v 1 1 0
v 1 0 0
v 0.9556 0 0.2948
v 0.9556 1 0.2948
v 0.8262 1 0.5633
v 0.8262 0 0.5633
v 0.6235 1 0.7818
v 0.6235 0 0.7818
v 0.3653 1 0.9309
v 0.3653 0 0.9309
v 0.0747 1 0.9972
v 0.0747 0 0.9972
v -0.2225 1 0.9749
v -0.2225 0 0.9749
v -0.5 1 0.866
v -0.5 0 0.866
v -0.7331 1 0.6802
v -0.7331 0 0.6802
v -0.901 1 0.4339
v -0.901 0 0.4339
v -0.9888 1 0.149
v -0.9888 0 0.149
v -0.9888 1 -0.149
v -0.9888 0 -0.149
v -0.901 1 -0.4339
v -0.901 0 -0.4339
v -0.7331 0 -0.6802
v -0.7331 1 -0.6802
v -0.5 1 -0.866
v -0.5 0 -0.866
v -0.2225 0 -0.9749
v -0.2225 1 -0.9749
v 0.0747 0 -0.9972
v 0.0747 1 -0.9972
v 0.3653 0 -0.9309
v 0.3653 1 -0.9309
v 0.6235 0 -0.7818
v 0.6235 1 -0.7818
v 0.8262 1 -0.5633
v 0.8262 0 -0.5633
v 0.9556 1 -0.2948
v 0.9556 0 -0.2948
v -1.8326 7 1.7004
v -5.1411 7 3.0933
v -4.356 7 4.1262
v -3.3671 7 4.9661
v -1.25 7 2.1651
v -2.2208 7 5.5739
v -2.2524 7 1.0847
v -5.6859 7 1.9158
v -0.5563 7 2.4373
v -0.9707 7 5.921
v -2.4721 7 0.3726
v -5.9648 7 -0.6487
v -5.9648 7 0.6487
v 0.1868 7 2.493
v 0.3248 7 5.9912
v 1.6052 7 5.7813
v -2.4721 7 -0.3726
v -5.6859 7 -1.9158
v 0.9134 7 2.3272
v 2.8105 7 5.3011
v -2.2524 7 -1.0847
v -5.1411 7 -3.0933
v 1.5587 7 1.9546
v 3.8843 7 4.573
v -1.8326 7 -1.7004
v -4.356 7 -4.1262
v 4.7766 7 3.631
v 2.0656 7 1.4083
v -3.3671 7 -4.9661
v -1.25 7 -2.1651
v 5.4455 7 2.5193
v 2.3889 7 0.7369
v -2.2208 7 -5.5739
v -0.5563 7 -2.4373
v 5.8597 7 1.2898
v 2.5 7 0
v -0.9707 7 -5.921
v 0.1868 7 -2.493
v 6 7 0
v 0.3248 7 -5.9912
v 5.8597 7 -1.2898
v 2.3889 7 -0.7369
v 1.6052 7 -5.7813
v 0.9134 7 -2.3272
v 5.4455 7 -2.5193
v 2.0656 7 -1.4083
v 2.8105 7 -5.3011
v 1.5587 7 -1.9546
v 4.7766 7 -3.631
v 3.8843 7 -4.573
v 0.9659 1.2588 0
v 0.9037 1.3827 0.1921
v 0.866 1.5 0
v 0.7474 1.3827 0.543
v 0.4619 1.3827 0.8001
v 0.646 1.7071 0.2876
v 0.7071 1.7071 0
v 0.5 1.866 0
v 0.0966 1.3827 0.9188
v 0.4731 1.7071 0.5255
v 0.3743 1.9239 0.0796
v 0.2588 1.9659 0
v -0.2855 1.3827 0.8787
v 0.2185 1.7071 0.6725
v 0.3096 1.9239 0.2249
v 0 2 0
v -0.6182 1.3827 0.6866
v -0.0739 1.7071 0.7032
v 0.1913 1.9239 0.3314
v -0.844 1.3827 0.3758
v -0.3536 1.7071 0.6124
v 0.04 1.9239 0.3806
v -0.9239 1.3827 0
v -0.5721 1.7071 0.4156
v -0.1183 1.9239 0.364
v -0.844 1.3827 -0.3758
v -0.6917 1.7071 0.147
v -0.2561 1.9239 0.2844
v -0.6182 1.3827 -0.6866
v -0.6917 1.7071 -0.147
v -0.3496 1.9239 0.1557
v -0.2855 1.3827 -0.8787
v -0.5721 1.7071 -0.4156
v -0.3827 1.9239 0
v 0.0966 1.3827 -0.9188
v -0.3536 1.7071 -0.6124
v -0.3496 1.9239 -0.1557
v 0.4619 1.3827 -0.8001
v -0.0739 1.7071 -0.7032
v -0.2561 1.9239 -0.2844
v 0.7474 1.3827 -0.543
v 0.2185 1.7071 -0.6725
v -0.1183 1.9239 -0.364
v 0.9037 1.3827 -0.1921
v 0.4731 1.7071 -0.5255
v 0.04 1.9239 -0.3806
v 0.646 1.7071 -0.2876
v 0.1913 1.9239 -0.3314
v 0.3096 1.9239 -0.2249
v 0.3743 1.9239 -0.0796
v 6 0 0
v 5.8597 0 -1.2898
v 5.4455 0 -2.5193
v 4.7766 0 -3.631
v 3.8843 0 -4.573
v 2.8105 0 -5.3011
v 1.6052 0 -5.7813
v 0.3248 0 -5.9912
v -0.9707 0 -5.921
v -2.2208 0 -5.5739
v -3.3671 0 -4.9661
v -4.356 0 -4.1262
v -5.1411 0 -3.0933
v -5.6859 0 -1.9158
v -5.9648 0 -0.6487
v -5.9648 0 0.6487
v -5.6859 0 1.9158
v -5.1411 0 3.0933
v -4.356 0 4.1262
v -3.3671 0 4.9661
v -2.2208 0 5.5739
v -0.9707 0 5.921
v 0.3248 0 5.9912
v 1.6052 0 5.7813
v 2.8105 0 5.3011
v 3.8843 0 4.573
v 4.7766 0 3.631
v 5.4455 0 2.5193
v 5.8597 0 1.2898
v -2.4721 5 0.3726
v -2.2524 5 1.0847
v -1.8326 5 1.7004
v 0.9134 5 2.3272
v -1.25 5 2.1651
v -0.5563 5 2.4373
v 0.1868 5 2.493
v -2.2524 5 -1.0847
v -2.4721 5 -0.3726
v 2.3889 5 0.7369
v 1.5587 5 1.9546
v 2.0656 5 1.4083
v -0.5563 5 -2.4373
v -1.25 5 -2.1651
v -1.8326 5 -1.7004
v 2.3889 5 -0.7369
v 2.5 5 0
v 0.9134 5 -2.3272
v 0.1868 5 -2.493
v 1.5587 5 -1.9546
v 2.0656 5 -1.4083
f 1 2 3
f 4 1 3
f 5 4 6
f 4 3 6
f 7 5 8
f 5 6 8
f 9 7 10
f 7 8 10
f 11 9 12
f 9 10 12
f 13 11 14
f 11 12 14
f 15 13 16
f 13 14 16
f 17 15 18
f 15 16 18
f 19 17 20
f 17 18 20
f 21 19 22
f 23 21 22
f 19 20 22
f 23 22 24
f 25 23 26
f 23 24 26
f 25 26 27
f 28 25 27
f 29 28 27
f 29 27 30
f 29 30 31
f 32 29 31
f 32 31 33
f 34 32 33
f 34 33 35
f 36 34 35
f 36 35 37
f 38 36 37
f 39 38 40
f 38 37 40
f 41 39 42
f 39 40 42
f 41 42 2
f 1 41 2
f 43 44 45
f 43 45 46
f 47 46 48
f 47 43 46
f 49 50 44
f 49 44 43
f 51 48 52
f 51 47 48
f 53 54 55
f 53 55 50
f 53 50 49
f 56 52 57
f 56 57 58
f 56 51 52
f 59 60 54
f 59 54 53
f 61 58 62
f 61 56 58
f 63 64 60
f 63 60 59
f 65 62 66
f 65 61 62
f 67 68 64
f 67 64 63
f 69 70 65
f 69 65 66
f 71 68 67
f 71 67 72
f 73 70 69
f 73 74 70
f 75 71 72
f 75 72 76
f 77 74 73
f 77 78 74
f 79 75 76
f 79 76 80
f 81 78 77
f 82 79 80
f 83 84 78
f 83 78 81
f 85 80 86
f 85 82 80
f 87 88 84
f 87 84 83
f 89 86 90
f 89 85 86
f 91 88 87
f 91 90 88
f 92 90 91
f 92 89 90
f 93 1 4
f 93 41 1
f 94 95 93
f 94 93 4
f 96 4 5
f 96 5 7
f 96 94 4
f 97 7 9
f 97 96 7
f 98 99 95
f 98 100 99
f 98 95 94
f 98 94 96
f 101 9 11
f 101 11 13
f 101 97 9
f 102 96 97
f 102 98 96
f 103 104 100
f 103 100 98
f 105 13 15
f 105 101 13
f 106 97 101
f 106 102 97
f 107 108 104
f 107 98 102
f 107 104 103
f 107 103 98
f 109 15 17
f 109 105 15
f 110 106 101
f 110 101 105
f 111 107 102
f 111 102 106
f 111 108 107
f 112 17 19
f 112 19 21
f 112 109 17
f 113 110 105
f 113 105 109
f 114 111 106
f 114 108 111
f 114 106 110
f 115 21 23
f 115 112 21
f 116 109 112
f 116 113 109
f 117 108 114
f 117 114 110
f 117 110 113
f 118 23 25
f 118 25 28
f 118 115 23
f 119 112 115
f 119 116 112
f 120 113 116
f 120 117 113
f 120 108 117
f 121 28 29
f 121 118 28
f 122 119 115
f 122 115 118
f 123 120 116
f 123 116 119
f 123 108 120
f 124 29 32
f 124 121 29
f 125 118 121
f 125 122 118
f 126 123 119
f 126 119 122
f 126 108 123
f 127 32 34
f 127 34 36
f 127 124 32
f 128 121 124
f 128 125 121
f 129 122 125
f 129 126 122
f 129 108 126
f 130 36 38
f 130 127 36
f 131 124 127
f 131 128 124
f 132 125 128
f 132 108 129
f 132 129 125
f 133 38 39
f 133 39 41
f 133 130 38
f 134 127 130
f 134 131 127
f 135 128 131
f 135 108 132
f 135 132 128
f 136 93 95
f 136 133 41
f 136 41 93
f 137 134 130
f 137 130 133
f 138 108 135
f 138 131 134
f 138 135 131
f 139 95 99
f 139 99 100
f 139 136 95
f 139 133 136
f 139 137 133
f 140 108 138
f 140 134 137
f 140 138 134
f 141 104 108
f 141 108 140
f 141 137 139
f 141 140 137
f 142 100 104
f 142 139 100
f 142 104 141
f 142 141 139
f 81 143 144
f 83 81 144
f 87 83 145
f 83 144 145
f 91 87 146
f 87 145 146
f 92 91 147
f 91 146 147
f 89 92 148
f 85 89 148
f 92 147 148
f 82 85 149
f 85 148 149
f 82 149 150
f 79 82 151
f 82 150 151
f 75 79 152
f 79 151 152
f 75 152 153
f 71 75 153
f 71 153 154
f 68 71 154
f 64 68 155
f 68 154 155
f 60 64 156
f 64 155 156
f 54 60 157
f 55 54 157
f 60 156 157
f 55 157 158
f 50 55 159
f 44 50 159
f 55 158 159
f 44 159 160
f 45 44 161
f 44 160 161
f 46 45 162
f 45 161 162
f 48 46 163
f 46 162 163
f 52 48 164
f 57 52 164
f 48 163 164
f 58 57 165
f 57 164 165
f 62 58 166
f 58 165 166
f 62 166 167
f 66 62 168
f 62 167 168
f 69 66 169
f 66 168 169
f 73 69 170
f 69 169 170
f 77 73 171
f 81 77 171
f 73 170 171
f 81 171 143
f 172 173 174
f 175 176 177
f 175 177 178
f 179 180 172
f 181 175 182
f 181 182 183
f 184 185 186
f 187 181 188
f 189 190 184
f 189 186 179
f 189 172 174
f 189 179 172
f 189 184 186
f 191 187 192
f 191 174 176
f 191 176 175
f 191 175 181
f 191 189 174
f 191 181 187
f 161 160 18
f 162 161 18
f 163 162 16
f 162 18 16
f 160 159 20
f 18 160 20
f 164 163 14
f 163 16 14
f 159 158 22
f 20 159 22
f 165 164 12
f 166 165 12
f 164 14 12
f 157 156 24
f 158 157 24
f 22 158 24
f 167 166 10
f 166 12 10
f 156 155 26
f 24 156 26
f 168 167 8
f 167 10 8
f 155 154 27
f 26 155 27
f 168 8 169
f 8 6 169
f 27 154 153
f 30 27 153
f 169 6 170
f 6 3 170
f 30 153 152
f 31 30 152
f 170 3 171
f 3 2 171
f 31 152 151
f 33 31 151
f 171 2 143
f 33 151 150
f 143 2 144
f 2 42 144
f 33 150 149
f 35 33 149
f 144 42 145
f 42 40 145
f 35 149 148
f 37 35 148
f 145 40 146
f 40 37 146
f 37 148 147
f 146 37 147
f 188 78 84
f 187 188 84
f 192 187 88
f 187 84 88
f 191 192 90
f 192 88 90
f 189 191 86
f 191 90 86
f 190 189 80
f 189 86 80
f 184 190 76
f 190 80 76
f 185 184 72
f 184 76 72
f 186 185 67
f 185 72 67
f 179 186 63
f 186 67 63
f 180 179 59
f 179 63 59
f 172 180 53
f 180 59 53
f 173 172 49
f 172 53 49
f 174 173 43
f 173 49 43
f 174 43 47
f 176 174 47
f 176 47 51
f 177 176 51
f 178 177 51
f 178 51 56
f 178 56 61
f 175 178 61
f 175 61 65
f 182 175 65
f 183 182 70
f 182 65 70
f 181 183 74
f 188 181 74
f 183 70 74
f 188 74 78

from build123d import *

# Parameters (mm, degrees)
SKETCH1_R           = 6
BOSS_EXTRUDE1_DEPTH = 7
SKETCH2_R           = 2.5
CUT_EXTRUDE1_DEPTH  = 2
SKETCH4_R           = 1
CUT_EXTRUDE3_DEPTH  = 2
FILLET1_R           = 1


with BuildPart() as part:
    # Sketch1 → Boss-Extrude1 (new body)
    with BuildSketch(Plane(origin=(0, 0, 0), x_dir=(1, 0, 0), z_dir=(0, 1, 0))):
        Circle(SKETCH1_R)
    extrude(amount=BOSS_EXTRUDE1_DEPTH)

    # Sketch2 → Cut-Extrude1 (cut)
    with BuildSketch(Plane(origin=(0, 7, 0), x_dir=(1, 0, 0), z_dir=(0, 1, 0))):
        Circle(SKETCH2_R)
    extrude(amount=-CUT_EXTRUDE1_DEPTH, mode=Mode.SUBTRACT)

    # Sketch4 → Cut-Extrude3 (cut)
    with BuildSketch(Plane.XZ):
        Circle(SKETCH4_R)
    extrude(amount=-CUT_EXTRUDE3_DEPTH, mode=Mode.SUBTRACT)

    # Fillet1
    fillet1_edges = [part.edges().sort_by_distance(p)[0] for p in [
        (-1, 2, 0),
    ]]
    fillet(fillet1_edges, radius=FILLET1_R)


solid = part.part
